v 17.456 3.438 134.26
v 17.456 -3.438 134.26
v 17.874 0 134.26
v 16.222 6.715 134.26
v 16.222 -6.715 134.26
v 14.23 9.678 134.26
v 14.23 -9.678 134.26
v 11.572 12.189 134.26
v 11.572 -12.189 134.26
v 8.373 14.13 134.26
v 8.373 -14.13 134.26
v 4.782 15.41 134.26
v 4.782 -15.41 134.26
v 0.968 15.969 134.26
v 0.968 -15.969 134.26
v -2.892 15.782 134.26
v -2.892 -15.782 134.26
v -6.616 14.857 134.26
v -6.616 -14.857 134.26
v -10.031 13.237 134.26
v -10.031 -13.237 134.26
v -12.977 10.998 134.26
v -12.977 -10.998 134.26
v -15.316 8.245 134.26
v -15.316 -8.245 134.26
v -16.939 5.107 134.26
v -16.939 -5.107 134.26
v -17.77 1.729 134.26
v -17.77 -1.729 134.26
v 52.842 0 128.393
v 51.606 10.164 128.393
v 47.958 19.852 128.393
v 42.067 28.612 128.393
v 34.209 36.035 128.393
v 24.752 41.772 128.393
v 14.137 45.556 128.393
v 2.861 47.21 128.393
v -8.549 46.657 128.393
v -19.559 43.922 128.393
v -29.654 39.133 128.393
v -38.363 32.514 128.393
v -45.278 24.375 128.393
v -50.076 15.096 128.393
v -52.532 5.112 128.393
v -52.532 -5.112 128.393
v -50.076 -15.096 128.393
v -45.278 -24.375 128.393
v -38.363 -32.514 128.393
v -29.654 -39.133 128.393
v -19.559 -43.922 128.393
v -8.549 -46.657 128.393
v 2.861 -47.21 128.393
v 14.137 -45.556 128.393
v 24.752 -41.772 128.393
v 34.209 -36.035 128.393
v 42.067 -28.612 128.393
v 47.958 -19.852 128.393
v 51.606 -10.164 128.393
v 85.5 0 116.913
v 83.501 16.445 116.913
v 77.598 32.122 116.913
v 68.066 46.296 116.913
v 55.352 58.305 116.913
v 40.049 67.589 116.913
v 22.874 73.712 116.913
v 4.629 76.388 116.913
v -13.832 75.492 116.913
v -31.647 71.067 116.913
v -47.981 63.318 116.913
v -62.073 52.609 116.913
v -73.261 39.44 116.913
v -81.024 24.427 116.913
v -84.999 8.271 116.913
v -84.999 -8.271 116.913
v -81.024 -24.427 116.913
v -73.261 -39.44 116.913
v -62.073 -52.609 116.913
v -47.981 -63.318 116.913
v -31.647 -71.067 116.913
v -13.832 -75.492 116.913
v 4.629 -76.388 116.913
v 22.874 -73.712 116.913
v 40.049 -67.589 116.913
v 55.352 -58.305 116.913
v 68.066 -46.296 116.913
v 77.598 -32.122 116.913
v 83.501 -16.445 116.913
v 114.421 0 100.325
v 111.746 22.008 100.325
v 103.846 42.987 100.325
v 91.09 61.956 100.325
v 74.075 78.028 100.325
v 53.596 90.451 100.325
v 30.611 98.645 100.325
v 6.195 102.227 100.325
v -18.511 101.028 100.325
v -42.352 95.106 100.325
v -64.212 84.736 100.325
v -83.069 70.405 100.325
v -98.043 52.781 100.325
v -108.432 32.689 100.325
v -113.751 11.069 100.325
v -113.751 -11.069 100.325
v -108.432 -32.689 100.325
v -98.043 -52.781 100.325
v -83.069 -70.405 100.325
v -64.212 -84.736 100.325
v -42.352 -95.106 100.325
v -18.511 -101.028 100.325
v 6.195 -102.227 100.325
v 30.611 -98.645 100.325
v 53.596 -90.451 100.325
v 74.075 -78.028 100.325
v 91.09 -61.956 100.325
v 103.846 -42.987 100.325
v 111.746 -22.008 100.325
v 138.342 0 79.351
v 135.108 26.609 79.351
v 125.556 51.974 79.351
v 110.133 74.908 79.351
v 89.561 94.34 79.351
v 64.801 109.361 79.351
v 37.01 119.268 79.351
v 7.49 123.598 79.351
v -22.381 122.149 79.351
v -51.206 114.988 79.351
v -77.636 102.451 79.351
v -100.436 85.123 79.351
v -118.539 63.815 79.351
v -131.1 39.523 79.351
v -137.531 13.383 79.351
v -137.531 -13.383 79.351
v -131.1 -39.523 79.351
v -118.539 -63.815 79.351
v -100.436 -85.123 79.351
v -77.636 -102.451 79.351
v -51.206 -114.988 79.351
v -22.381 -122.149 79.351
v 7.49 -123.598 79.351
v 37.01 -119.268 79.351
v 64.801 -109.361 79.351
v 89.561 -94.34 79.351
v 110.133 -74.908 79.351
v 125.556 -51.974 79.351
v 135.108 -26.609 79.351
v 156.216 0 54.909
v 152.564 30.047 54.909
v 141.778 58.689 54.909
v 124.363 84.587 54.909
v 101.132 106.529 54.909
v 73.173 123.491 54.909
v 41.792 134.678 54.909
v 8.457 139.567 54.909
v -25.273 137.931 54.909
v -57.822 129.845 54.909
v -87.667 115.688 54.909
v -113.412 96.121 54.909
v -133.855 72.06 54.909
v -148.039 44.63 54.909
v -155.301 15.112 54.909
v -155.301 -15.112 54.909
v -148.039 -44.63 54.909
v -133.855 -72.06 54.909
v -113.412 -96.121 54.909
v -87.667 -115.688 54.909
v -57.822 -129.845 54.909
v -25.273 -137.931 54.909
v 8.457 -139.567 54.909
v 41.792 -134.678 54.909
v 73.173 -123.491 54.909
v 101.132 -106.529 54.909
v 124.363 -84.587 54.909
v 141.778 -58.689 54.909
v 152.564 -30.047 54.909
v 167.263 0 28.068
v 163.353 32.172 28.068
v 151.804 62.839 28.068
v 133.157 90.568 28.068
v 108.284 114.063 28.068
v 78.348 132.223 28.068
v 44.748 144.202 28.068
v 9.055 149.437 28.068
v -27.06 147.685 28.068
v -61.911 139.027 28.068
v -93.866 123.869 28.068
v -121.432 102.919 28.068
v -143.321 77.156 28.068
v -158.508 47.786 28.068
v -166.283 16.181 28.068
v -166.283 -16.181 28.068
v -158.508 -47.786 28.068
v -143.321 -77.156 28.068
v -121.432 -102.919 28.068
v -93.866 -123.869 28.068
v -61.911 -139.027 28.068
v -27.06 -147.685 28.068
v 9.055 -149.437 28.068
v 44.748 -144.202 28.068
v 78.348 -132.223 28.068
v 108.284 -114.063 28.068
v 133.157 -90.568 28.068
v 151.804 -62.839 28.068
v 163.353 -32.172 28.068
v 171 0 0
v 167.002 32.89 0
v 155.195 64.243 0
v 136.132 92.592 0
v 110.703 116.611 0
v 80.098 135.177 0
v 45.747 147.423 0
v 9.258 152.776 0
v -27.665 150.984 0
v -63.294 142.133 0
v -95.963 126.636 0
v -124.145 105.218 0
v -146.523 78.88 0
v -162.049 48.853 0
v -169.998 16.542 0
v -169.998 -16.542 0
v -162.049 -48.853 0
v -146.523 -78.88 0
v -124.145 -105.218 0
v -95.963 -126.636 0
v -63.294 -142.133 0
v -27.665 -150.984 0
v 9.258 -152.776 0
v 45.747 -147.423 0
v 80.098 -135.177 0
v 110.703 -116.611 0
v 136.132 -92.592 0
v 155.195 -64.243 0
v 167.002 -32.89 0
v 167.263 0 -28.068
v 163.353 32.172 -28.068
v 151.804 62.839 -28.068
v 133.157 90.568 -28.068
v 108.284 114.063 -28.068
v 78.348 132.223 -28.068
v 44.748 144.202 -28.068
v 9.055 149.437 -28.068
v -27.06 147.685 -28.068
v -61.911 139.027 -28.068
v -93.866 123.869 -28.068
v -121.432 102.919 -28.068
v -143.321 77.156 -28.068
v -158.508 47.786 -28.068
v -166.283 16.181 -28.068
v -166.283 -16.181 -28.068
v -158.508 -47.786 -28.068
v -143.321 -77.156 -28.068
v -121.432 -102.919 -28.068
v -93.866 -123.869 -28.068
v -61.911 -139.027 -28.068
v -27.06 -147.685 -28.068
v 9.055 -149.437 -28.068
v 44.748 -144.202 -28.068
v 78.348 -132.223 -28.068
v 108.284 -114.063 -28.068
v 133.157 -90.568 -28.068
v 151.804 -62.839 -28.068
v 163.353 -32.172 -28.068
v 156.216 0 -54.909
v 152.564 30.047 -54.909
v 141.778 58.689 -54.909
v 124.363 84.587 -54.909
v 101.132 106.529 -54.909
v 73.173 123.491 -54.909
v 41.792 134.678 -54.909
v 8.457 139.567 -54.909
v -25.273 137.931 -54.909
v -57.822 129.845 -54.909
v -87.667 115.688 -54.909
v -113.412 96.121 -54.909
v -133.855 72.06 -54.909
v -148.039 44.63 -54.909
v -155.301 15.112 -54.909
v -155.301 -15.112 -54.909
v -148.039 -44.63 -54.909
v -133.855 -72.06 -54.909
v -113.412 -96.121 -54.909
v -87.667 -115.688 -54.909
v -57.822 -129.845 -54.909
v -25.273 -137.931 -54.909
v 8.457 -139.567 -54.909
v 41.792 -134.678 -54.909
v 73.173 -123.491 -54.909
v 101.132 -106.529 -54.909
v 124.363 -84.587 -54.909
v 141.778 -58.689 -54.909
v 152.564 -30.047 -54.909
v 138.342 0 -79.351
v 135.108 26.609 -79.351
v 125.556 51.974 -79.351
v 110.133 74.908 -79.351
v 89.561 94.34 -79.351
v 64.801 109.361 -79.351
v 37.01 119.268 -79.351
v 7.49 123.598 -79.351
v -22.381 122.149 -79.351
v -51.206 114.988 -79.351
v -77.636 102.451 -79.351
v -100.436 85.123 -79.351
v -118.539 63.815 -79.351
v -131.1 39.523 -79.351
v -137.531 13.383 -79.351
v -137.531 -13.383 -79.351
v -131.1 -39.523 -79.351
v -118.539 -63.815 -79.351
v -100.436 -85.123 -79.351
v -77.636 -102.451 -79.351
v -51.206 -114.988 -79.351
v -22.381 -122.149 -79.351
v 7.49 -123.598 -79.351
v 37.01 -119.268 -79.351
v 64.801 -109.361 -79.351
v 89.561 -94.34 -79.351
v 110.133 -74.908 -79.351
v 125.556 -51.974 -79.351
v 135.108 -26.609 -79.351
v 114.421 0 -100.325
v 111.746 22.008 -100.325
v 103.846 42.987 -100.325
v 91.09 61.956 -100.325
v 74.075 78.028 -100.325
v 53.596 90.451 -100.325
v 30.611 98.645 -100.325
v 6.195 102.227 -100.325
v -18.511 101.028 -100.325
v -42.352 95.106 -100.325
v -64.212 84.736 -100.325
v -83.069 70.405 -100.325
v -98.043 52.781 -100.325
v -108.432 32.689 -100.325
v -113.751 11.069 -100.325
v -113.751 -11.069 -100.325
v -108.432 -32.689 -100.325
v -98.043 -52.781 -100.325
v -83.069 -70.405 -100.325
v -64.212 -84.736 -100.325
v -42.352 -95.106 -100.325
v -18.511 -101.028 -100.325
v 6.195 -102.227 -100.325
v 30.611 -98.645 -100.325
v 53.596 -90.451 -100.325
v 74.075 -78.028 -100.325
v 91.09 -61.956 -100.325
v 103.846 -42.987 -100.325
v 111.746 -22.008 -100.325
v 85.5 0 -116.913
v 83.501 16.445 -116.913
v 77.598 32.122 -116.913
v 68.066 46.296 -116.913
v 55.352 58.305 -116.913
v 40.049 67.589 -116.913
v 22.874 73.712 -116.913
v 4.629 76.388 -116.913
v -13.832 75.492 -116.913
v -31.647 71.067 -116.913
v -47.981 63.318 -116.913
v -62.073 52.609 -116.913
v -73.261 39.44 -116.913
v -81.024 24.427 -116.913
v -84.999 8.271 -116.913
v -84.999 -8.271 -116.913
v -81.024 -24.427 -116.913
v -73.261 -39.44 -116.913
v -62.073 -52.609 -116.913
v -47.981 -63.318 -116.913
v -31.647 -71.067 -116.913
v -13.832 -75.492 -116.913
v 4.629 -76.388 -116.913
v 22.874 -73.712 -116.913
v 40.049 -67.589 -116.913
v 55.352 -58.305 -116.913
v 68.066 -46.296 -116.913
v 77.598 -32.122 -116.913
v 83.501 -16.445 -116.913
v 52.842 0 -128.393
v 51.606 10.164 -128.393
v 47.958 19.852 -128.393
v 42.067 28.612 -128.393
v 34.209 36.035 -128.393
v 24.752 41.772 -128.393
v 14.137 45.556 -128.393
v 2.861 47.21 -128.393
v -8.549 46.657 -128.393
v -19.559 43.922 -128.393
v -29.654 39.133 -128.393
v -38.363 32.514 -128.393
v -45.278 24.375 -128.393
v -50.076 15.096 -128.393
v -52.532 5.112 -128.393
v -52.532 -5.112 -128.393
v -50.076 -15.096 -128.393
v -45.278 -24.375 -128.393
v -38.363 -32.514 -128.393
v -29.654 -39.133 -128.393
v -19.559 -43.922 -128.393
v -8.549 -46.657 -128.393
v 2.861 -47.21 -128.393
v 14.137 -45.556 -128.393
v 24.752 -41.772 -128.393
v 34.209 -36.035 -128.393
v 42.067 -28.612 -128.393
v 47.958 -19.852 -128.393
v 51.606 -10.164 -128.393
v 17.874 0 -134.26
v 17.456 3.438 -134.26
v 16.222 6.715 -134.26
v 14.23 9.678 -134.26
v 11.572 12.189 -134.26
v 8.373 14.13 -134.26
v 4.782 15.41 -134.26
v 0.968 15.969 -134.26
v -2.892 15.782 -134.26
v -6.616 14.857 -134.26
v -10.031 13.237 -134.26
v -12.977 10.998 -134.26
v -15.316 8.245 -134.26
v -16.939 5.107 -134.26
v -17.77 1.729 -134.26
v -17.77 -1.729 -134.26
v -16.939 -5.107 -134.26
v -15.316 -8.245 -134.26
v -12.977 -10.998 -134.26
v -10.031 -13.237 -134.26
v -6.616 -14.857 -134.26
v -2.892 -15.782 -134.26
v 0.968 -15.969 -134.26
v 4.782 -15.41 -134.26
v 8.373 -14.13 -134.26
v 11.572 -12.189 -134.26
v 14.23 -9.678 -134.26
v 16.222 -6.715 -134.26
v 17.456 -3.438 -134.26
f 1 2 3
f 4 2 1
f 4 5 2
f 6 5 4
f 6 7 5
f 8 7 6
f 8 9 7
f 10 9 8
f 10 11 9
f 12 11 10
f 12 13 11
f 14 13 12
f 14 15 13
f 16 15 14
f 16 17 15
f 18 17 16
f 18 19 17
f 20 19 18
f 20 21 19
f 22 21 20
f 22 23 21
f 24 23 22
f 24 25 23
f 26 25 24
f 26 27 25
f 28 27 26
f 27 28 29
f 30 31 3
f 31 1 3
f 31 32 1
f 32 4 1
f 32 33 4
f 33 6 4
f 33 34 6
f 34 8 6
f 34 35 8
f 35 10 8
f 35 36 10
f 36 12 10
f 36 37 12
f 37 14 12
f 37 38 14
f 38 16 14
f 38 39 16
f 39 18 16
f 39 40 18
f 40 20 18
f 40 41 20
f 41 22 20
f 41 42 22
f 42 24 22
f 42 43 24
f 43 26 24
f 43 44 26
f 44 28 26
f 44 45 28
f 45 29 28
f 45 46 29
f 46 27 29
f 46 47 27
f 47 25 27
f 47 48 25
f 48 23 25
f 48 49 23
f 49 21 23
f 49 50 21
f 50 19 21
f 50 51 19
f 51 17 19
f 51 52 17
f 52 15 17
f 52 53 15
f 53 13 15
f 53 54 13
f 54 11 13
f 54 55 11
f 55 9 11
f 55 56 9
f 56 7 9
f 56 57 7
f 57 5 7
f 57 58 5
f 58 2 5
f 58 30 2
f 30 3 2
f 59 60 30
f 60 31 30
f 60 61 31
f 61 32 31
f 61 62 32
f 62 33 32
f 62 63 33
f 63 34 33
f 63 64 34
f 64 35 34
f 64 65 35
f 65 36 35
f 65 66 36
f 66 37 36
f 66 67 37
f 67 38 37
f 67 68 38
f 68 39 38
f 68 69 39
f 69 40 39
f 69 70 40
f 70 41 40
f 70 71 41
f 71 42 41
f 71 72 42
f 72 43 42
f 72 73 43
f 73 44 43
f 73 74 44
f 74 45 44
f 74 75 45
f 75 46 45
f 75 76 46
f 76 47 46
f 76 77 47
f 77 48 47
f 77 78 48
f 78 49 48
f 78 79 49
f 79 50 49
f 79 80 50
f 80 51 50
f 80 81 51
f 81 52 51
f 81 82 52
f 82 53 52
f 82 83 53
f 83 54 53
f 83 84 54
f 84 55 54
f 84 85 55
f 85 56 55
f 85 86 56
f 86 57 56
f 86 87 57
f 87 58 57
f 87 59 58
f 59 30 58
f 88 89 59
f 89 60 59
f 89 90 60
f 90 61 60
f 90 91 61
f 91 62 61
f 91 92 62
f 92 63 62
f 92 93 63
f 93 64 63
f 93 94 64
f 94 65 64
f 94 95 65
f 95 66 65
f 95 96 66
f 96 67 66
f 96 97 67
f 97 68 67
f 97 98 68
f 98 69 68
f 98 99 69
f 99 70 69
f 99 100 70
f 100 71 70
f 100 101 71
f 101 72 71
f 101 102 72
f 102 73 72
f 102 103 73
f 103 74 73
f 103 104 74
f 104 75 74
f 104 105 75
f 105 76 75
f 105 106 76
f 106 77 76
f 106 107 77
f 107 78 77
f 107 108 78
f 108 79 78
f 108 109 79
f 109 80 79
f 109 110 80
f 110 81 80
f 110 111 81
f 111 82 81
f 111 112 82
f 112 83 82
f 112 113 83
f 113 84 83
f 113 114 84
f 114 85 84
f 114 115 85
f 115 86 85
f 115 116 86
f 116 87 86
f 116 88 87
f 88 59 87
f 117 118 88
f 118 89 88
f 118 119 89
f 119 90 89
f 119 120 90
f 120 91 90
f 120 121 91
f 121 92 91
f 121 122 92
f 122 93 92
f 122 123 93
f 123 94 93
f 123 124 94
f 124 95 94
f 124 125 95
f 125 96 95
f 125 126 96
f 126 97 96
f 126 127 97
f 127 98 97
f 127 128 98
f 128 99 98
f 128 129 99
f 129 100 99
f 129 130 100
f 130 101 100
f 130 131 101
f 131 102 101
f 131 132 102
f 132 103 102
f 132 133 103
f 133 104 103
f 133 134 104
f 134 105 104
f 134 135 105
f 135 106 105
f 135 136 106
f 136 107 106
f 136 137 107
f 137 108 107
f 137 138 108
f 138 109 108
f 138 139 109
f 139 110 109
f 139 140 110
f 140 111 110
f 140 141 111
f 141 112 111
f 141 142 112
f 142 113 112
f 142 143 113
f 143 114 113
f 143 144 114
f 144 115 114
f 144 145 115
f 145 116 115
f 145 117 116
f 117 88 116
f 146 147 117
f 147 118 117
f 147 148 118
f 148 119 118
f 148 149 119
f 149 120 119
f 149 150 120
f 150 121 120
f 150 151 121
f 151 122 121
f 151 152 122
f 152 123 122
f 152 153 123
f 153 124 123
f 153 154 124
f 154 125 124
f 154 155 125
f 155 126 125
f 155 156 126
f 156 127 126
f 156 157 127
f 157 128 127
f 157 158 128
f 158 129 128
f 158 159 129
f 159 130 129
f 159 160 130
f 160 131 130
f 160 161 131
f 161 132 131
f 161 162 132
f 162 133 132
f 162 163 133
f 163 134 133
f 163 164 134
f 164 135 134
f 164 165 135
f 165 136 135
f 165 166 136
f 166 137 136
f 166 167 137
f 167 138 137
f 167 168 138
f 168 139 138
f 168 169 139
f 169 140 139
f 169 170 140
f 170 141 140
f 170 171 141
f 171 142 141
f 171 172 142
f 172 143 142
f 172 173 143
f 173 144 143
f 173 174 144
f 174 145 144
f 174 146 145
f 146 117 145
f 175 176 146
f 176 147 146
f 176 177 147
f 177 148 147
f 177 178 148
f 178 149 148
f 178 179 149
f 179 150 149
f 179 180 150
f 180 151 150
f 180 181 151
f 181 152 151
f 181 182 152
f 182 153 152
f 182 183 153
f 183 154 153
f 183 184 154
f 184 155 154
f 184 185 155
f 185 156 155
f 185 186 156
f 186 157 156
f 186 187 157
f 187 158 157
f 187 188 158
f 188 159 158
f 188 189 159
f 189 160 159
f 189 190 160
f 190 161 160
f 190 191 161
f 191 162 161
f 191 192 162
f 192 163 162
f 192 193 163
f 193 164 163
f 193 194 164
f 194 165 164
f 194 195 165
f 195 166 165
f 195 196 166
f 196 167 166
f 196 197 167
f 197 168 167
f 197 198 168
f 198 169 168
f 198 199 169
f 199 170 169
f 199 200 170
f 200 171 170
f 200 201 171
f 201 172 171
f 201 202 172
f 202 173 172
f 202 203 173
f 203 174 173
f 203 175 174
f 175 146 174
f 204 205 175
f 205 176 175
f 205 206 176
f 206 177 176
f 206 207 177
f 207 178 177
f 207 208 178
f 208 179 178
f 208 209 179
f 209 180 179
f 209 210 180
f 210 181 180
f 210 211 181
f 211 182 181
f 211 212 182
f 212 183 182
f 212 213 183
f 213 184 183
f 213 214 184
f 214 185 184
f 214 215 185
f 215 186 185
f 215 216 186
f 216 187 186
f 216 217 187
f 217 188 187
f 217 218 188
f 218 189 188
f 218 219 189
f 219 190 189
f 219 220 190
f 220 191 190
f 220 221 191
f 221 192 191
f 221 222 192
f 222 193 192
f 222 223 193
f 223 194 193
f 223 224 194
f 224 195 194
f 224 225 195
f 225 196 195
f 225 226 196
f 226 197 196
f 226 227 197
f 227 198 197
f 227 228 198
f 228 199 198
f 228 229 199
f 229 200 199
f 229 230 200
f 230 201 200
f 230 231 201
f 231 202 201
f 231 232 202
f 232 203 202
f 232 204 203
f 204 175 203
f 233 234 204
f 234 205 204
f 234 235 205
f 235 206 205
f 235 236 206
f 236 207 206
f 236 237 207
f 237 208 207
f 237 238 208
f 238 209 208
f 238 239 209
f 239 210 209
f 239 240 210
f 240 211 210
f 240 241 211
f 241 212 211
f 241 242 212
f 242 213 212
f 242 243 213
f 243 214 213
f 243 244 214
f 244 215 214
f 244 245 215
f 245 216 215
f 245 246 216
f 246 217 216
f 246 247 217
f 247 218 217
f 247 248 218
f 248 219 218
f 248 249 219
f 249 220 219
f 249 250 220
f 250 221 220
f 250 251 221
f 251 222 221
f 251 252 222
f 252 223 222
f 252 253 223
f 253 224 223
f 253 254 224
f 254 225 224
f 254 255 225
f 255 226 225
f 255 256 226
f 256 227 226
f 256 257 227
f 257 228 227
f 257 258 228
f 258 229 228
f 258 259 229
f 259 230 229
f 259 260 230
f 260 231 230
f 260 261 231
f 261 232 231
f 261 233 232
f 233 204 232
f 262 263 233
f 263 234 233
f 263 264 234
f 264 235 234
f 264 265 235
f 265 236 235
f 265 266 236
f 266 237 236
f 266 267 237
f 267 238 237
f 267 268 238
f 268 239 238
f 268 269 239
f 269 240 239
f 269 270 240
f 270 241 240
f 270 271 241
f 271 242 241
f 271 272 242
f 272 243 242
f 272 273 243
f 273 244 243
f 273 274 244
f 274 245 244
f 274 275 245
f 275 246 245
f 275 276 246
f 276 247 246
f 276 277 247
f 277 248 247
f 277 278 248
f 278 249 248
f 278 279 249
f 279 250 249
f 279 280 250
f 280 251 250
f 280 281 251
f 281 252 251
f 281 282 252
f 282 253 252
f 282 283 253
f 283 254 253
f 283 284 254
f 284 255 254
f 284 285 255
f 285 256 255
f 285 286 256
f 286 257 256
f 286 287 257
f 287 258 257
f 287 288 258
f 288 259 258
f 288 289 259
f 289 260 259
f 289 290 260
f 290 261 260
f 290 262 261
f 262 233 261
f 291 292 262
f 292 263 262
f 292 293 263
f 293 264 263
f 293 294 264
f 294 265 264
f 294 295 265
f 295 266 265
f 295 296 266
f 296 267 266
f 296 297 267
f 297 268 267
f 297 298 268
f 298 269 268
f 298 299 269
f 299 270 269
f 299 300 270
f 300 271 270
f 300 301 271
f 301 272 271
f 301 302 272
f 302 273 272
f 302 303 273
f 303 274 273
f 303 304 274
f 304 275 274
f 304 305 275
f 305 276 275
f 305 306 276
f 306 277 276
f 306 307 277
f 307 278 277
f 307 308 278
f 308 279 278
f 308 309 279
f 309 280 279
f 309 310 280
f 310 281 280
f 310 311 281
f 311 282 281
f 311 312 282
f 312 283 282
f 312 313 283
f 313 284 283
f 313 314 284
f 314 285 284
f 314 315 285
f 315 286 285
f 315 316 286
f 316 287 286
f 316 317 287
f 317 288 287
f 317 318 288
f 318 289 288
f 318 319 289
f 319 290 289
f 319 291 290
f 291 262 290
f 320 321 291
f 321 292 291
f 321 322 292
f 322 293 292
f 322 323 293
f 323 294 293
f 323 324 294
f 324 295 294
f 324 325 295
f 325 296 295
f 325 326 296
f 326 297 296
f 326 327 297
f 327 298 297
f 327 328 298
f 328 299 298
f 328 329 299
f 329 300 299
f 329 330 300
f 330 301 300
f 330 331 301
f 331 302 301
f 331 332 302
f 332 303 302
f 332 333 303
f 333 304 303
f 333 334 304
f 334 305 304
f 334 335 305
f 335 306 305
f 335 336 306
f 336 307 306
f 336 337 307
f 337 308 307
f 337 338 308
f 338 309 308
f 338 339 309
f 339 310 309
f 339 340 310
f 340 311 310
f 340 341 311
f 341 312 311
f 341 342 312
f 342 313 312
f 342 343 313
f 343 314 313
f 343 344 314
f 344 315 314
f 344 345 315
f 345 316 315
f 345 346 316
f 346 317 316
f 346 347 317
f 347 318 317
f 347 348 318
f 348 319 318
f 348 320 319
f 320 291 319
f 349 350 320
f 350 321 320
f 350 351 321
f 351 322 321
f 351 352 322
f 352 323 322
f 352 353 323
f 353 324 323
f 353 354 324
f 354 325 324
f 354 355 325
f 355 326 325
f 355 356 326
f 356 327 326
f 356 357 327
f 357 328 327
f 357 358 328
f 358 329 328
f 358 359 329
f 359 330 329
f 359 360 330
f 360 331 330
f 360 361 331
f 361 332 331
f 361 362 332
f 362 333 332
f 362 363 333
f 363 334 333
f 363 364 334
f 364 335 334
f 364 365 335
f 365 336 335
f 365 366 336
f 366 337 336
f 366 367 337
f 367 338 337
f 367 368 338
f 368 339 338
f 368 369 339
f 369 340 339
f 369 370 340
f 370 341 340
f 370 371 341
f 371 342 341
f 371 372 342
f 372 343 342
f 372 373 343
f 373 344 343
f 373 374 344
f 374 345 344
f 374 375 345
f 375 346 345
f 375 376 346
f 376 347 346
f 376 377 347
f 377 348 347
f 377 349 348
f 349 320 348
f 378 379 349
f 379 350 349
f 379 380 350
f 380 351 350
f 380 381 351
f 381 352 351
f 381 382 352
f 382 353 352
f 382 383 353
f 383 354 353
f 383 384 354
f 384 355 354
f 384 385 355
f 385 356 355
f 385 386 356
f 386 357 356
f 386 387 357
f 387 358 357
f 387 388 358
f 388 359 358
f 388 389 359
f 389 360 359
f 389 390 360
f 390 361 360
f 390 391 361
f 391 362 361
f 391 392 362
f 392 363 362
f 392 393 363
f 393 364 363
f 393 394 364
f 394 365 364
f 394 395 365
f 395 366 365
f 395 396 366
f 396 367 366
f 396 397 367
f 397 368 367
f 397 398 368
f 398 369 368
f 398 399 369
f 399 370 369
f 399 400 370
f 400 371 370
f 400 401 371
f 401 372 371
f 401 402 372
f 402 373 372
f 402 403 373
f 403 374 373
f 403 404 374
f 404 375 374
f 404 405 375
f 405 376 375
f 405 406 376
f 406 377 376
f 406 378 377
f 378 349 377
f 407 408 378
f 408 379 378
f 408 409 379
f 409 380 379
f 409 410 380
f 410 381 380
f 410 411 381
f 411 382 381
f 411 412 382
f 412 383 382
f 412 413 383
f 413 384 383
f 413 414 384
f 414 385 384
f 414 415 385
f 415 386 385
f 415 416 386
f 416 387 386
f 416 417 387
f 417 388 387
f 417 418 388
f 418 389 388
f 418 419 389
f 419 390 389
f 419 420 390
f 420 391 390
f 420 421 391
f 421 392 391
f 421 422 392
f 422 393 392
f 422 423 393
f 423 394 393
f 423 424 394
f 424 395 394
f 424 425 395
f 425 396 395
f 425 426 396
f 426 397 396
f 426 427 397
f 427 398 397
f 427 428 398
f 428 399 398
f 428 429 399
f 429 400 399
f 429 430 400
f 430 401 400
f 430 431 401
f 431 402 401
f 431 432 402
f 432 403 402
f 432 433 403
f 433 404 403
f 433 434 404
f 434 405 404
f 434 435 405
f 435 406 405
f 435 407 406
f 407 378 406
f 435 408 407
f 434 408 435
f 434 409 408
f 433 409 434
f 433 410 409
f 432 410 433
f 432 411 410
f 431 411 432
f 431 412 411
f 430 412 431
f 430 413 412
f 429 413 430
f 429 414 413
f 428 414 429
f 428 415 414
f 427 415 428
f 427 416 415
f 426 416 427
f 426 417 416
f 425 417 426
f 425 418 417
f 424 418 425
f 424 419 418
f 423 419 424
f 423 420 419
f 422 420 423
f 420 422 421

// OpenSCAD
// Generated by SolidPython 1.0.1 on 2020-07-29 00:46:54


scale(v = [19, 17, 15]) {
	sphere(r = 9);
}
/***********************************************
*********      SolidPython code:      **********
************************************************
 
# import packages: SolidPython
from solid import *
from solid.utils import *
from itertools import chain, combinations, permutations


class Resize:

    def __init__(self, scad_file):
        self.scad_file = scad_file
        #self.scad_file = import_scad(scad_file)
        # cone/cylinder param:
        self.r1 = 0
        self.r2 = 0
        self.h = 0
        # rectangular prism param:
        self.w = 0
        self.l = 0
        # ellipse param:
        self.r = 0

    # import OpenScad code (file name corresponds to shape)


    # classify shape + parameters
    def assign(self, param1, param2, param3):
        if self.scad_file == 'cone.scad':
            self.r1 = param1
            self.r2 = param2
            self.h = param3
        elif self.scad_file == 'cylinder.scad':
            self.r1 = param1
            self.r2 = param2
            self.h = param3
        elif self.scad_file == 'rectangularPrism.scad':
            self.h = param1
            self.l = param2
            self.w = param3
        else:
            self.r = param1
            self.h = param2

    # resize parameters
    def iterate(self):
        x = range(3, 20, 2)
        i = 1
        if self.scad_file == 'cone.scad':
            tempList = list(permutations(x, 2))
            for temp in tempList:
                param1 = temp[0]
                param2 = temp[1]
                filepath = 'produced_scad_files/' + 'cone' + str(param1) + '_' + str(param2) + '_' + '.scad'
                scad_render_to_file(cylinder(h=param1, r1=param2, r2=0), filepath)

        elif self.scad_file == 'cylinder.scad':
            tempList = list(permutations(x, 3))
            for temp in tempList:
                param1 = temp[0]
                param2 = temp[1]
                filepath = 'produced_scad_files/' + 'cylinder' + str(param1) + '_' + str(param2) + '_' + '.scad'
                scad_render_to_file(cylinder(h=param1, r1=param2, r2=param2), filepath)

        elif self.scad_file == 'rectangularPrism.scad':
            tempList = list(permutations(x, 3))
            for temp in tempList:
                param1 = temp[0]
                param2 = temp[1]
                param3 = temp[2]
                filepath = 'produced_scad_files/' + 'rectangularPrism' + str(param1) + '_' + str(param2) + '_' + str(
                    param3) + '.scad'
                scad_render_to_file(cube(size=(param1, param2, param3)), filepath)

        elif self.scad_file == 'ellipse.scad':
            tempList = list(permutations(x, 4))
            for temp in tempList:
                param1 = temp[0]
                param2 = temp[1]
                param3 = temp[2]
                param4 = temp[3]
                filepath = 'produced_scad_files/' + 'ellipse' + str(param1) + '_' + str(param2) + '_' + str(param3) + '_' + str(param4) + '.scad'
                scad_render_to_file(scale([param1, param2, param3])(sphere(r=param4)), filepath)

    def render_to_scadfile(self):
        scad_render_to_file(scad, 'example.scad') 
 
************************************************/
